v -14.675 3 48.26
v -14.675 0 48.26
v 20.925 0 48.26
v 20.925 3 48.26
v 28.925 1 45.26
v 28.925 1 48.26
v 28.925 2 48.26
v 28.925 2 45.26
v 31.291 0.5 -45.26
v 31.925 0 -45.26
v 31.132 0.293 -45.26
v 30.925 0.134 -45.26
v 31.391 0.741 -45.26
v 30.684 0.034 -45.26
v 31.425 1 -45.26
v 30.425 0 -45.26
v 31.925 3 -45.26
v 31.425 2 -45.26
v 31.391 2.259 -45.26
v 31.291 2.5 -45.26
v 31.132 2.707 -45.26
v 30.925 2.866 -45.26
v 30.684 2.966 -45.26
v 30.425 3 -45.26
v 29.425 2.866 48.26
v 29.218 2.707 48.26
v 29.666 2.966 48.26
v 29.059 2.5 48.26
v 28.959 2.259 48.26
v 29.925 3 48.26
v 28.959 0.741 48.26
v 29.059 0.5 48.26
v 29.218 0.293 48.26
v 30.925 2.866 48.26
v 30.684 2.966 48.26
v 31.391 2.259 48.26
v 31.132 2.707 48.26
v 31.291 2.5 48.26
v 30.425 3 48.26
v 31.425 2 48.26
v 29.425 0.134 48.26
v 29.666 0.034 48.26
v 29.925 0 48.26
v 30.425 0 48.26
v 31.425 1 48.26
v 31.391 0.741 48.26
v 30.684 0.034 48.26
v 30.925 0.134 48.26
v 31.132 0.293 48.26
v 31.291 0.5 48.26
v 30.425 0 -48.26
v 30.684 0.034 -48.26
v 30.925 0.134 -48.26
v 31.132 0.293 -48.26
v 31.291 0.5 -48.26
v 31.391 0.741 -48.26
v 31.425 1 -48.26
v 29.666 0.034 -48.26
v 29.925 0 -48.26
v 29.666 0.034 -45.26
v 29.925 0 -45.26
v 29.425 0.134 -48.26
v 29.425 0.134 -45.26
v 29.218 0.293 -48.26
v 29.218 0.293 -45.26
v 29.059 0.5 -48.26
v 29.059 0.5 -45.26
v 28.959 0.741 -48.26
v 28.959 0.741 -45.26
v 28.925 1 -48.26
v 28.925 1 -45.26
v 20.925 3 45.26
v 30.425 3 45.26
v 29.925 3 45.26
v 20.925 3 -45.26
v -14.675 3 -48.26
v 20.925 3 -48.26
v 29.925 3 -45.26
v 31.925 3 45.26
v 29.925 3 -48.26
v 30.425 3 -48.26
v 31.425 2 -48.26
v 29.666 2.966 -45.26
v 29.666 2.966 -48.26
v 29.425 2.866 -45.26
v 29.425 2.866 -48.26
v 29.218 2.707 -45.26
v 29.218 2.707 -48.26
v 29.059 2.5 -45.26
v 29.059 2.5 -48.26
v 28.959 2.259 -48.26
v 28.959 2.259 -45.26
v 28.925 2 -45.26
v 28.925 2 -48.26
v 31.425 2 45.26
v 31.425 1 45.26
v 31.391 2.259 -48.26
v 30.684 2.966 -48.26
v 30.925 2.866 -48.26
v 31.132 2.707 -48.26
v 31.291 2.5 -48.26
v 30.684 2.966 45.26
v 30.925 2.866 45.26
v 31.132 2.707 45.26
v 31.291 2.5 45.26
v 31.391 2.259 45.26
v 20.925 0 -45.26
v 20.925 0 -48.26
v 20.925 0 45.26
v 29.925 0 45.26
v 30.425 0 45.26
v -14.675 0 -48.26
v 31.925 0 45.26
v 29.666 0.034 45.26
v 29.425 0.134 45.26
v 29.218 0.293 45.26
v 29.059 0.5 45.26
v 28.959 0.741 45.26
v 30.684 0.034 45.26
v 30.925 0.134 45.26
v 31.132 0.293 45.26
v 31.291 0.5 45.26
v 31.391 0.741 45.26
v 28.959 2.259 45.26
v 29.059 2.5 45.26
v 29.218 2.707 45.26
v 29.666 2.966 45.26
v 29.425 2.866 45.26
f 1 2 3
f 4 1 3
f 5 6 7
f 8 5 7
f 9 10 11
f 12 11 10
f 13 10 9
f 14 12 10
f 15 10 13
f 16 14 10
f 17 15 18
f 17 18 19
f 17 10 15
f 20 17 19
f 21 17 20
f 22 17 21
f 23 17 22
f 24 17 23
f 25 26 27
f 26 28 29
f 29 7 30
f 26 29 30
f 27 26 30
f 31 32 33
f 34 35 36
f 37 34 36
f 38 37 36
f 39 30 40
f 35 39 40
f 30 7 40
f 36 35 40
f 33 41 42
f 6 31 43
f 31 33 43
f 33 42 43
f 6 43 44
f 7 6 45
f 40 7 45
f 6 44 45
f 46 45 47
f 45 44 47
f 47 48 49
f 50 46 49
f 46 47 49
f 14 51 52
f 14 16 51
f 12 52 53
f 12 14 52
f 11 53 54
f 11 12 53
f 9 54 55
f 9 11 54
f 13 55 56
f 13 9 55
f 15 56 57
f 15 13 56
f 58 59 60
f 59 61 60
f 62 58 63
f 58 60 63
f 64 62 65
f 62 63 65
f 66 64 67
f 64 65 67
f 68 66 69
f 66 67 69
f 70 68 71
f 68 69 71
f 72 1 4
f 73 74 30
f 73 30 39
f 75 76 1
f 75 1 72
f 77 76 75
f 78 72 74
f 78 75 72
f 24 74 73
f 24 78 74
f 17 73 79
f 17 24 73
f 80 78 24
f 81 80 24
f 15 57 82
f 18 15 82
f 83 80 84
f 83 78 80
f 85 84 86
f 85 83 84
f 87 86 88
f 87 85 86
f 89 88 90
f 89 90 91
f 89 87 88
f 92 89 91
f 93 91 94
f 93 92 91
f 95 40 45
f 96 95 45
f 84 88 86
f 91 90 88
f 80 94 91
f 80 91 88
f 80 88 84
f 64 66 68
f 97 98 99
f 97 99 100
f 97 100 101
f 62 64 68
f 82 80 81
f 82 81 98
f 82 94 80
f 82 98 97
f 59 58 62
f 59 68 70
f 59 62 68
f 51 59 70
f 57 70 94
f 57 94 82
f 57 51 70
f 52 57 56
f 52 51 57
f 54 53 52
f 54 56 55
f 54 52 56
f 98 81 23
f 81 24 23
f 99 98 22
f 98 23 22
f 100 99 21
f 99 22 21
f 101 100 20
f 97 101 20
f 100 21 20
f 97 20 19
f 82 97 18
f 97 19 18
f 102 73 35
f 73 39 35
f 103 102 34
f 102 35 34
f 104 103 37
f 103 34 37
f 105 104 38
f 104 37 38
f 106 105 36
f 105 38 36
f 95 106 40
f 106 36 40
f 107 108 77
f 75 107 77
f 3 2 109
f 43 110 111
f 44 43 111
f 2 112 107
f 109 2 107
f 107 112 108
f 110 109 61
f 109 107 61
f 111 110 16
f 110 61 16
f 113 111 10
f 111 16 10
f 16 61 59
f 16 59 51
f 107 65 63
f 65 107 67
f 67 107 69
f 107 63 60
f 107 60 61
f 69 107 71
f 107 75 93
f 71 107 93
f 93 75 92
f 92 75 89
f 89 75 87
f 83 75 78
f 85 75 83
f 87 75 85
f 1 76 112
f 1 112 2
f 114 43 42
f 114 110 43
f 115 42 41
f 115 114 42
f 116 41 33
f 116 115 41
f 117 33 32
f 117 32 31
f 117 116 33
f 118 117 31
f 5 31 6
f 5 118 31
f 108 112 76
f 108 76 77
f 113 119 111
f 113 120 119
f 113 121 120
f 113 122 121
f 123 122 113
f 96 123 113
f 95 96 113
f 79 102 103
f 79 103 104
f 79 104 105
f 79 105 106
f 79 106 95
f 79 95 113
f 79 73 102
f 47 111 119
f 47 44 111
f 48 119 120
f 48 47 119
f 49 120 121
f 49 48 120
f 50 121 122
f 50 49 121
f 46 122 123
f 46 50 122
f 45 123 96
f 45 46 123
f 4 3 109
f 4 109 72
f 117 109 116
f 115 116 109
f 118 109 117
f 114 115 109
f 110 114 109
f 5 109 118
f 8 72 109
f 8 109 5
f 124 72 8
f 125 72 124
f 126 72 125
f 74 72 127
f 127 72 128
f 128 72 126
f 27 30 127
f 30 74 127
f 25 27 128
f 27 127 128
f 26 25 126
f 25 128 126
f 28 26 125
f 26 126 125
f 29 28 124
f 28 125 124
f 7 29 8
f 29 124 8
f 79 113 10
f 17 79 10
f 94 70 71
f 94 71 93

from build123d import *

# Parameters (mm, degrees)
SKETCH1_W               = 63.85
SKETCH1_H               = 96.52
BOSS_EXTRUDE1_DEPTH     = 3
SKETCH5_W               = 8
SKETCH5_H               = 3
CUT_EXTRUDE3_DEPTH      = 3
CUT_EXTRUDE6_DEPTH      = 1
CUT_EXTRUDE6_DEPTH_BACK = 3
SKETCH21_W              = 0.5
SKETCH21_H              = 3
CUT_EXTRUDE11_DEPTH     = 3
FILLET17_R              = 1
FILLET18_R              = 1
SKETCH22_W              = 96.52
SKETCH22_H              = 3
CUT_EXTRUDE12_DEPTH     = 17.25


with BuildPart() as part:
    # Sketch1 → Boss-Extrude1 (new body)
    with BuildSketch(Plane(origin=(0, 0, 0), x_dir=(1, 0, 0), z_dir=(0, 1, 0))):
        Rectangle(SKETCH1_W, SKETCH1_H)
    extrude(amount=BOSS_EXTRUDE1_DEPTH)

    # Sketch5 → Cut-Extrude3 (cut)
    with BuildSketch(Plane.XY.offset(48.26)):
        with Locations((24.925, 1.5)):
            Rectangle(SKETCH5_W, SKETCH5_H)
    cut_extrude3 = extrude(amount=-CUT_EXTRUDE3_DEPTH, mode=Mode.SUBTRACT)

    # Sketch20 → Cut-Extrude6 (cut, two sides)
    with BuildSketch(Plane.XY.offset(48.26)) as cut_extrude6_sk:
        Polygon((31.425, 139.841988316), (31.425, 3), (31.425, 0), (31.425, -136.841988316), (305.108976632, -136.841988316), (305.108976632, 139.841988316), align=None)
    extrude(amount=CUT_EXTRUDE6_DEPTH, mode=Mode.SUBTRACT)
    extrude(cut_extrude6_sk.sketch, amount=-CUT_EXTRUDE6_DEPTH_BACK, mode=Mode.SUBTRACT)

    # Mirror1: Cut-Extrude3 across plane
    add(cut_extrude3.mirror(Plane.XY), mode=Mode.SUBTRACT)

    # Sketch21 → Cut-Extrude11 (cut)
    with BuildSketch(Plane(origin=(0, 0, -48.26), x_dir=(-1, 0, 0), z_dir=(0, 0, -1))):
        with Locations((-31.675, 1.5)):
            Rectangle(SKETCH21_W, SKETCH21_H)
    extrude(amount=-CUT_EXTRUDE11_DEPTH, mode=Mode.SUBTRACT)

    # Fillet17
    fillet17_edges = [part.edges().sort_by_distance(p)[0] for p in [
        (28.925, 3, 46.76),
        (28.925, 0, 46.76),
        (31.425, 3, 46.76),
        (31.425, 0, 46.76),
    ]]
    fillet(fillet17_edges, radius=FILLET17_R)

    # Fillet18
    fillet18_edges = [part.edges().sort_by_distance(p)[0] for p in [
        (28.925, 3, -46.76),
        (28.925, 0, -46.76),
        (31.425, 3, -46.76),
        (31.425, 0, -46.76),
    ]]
    fillet(fillet18_edges, radius=FILLET18_R)

    # Sketch22 → Cut-Extrude12 (cut)
    with BuildSketch(Plane.ZY.offset(31.925)):
        with Locations((0, 1.5)):
            Rectangle(SKETCH22_W, SKETCH22_H)
    extrude(amount=-CUT_EXTRUDE12_DEPTH, mode=Mode.SUBTRACT)


solid = part.part
